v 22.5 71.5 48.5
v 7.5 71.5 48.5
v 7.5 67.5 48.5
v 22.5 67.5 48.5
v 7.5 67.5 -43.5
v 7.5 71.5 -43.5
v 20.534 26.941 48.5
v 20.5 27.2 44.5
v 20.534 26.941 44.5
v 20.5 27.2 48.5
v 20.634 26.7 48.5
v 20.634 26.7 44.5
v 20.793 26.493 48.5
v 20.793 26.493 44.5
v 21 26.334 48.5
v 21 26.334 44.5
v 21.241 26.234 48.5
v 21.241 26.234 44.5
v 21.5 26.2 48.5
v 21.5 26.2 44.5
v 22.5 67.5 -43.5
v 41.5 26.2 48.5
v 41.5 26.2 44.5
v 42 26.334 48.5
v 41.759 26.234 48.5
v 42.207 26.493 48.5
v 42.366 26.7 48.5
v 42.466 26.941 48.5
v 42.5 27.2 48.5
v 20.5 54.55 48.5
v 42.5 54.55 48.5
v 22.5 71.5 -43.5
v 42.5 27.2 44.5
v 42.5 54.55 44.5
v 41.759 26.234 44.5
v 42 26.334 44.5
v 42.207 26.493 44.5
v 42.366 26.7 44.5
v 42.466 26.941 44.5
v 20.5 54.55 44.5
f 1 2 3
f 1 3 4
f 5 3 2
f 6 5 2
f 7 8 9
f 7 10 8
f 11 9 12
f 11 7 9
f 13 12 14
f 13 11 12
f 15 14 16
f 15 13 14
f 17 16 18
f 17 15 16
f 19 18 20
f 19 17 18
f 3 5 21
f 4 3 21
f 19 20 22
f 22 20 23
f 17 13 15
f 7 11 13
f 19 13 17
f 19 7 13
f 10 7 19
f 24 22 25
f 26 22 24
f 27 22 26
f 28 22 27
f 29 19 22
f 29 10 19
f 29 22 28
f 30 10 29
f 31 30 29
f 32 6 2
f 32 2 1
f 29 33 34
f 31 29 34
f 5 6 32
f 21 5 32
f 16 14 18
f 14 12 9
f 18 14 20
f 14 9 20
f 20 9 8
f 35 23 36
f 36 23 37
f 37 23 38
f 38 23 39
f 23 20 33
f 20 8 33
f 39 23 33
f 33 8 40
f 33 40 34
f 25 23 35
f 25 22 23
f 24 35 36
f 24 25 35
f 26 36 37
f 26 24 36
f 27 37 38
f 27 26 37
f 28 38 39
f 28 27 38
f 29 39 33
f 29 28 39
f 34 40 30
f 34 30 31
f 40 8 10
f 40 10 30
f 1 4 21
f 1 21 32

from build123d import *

# Parameters (mm, degrees)
BOX022_W     = 22
BOX022_H     = 28.35
BOX022_DEPTH = 4
FILLET009_R  = 1
BOX024_W     = 15
BOX024_H     = 4
BOX024_DEPTH = 92


with BuildPart() as fillet009:
    # Box022 → Box022 (new body)
    with BuildSketch(Plane(origin=(20.5, 26.2, 44.5), x_dir=(1, 0, 0), z_dir=(0, 0, 1))):
        with Locations((11, 14.175)):
            Rectangle(BOX022_W, BOX022_H)
    extrude(amount=BOX022_DEPTH)

    # Fillet009
    fillet009_edges = [fillet009.edges().sort_by_distance(p)[0] for p in [
        (20.5, 26.2, 46.5),
        (42.5, 26.2, 46.5),
    ]]
    fillet(fillet009_edges, radius=FILLET009_R)


with BuildPart() as fusion002008006003:
    # Box024 → Box024 (new body)
    with BuildSketch(Plane(origin=(7.5, 67.5, -43.5), x_dir=(1, 0, 0), z_dir=(0, 0, 1))):
        with Locations((7.5, 2)):
            Rectangle(BOX024_W, BOX024_H)
    extrude(amount=BOX024_DEPTH)

    # Fusion002008006003: union Fillet009
    add(fillet009.part)


solid = fusion002008006003.part
